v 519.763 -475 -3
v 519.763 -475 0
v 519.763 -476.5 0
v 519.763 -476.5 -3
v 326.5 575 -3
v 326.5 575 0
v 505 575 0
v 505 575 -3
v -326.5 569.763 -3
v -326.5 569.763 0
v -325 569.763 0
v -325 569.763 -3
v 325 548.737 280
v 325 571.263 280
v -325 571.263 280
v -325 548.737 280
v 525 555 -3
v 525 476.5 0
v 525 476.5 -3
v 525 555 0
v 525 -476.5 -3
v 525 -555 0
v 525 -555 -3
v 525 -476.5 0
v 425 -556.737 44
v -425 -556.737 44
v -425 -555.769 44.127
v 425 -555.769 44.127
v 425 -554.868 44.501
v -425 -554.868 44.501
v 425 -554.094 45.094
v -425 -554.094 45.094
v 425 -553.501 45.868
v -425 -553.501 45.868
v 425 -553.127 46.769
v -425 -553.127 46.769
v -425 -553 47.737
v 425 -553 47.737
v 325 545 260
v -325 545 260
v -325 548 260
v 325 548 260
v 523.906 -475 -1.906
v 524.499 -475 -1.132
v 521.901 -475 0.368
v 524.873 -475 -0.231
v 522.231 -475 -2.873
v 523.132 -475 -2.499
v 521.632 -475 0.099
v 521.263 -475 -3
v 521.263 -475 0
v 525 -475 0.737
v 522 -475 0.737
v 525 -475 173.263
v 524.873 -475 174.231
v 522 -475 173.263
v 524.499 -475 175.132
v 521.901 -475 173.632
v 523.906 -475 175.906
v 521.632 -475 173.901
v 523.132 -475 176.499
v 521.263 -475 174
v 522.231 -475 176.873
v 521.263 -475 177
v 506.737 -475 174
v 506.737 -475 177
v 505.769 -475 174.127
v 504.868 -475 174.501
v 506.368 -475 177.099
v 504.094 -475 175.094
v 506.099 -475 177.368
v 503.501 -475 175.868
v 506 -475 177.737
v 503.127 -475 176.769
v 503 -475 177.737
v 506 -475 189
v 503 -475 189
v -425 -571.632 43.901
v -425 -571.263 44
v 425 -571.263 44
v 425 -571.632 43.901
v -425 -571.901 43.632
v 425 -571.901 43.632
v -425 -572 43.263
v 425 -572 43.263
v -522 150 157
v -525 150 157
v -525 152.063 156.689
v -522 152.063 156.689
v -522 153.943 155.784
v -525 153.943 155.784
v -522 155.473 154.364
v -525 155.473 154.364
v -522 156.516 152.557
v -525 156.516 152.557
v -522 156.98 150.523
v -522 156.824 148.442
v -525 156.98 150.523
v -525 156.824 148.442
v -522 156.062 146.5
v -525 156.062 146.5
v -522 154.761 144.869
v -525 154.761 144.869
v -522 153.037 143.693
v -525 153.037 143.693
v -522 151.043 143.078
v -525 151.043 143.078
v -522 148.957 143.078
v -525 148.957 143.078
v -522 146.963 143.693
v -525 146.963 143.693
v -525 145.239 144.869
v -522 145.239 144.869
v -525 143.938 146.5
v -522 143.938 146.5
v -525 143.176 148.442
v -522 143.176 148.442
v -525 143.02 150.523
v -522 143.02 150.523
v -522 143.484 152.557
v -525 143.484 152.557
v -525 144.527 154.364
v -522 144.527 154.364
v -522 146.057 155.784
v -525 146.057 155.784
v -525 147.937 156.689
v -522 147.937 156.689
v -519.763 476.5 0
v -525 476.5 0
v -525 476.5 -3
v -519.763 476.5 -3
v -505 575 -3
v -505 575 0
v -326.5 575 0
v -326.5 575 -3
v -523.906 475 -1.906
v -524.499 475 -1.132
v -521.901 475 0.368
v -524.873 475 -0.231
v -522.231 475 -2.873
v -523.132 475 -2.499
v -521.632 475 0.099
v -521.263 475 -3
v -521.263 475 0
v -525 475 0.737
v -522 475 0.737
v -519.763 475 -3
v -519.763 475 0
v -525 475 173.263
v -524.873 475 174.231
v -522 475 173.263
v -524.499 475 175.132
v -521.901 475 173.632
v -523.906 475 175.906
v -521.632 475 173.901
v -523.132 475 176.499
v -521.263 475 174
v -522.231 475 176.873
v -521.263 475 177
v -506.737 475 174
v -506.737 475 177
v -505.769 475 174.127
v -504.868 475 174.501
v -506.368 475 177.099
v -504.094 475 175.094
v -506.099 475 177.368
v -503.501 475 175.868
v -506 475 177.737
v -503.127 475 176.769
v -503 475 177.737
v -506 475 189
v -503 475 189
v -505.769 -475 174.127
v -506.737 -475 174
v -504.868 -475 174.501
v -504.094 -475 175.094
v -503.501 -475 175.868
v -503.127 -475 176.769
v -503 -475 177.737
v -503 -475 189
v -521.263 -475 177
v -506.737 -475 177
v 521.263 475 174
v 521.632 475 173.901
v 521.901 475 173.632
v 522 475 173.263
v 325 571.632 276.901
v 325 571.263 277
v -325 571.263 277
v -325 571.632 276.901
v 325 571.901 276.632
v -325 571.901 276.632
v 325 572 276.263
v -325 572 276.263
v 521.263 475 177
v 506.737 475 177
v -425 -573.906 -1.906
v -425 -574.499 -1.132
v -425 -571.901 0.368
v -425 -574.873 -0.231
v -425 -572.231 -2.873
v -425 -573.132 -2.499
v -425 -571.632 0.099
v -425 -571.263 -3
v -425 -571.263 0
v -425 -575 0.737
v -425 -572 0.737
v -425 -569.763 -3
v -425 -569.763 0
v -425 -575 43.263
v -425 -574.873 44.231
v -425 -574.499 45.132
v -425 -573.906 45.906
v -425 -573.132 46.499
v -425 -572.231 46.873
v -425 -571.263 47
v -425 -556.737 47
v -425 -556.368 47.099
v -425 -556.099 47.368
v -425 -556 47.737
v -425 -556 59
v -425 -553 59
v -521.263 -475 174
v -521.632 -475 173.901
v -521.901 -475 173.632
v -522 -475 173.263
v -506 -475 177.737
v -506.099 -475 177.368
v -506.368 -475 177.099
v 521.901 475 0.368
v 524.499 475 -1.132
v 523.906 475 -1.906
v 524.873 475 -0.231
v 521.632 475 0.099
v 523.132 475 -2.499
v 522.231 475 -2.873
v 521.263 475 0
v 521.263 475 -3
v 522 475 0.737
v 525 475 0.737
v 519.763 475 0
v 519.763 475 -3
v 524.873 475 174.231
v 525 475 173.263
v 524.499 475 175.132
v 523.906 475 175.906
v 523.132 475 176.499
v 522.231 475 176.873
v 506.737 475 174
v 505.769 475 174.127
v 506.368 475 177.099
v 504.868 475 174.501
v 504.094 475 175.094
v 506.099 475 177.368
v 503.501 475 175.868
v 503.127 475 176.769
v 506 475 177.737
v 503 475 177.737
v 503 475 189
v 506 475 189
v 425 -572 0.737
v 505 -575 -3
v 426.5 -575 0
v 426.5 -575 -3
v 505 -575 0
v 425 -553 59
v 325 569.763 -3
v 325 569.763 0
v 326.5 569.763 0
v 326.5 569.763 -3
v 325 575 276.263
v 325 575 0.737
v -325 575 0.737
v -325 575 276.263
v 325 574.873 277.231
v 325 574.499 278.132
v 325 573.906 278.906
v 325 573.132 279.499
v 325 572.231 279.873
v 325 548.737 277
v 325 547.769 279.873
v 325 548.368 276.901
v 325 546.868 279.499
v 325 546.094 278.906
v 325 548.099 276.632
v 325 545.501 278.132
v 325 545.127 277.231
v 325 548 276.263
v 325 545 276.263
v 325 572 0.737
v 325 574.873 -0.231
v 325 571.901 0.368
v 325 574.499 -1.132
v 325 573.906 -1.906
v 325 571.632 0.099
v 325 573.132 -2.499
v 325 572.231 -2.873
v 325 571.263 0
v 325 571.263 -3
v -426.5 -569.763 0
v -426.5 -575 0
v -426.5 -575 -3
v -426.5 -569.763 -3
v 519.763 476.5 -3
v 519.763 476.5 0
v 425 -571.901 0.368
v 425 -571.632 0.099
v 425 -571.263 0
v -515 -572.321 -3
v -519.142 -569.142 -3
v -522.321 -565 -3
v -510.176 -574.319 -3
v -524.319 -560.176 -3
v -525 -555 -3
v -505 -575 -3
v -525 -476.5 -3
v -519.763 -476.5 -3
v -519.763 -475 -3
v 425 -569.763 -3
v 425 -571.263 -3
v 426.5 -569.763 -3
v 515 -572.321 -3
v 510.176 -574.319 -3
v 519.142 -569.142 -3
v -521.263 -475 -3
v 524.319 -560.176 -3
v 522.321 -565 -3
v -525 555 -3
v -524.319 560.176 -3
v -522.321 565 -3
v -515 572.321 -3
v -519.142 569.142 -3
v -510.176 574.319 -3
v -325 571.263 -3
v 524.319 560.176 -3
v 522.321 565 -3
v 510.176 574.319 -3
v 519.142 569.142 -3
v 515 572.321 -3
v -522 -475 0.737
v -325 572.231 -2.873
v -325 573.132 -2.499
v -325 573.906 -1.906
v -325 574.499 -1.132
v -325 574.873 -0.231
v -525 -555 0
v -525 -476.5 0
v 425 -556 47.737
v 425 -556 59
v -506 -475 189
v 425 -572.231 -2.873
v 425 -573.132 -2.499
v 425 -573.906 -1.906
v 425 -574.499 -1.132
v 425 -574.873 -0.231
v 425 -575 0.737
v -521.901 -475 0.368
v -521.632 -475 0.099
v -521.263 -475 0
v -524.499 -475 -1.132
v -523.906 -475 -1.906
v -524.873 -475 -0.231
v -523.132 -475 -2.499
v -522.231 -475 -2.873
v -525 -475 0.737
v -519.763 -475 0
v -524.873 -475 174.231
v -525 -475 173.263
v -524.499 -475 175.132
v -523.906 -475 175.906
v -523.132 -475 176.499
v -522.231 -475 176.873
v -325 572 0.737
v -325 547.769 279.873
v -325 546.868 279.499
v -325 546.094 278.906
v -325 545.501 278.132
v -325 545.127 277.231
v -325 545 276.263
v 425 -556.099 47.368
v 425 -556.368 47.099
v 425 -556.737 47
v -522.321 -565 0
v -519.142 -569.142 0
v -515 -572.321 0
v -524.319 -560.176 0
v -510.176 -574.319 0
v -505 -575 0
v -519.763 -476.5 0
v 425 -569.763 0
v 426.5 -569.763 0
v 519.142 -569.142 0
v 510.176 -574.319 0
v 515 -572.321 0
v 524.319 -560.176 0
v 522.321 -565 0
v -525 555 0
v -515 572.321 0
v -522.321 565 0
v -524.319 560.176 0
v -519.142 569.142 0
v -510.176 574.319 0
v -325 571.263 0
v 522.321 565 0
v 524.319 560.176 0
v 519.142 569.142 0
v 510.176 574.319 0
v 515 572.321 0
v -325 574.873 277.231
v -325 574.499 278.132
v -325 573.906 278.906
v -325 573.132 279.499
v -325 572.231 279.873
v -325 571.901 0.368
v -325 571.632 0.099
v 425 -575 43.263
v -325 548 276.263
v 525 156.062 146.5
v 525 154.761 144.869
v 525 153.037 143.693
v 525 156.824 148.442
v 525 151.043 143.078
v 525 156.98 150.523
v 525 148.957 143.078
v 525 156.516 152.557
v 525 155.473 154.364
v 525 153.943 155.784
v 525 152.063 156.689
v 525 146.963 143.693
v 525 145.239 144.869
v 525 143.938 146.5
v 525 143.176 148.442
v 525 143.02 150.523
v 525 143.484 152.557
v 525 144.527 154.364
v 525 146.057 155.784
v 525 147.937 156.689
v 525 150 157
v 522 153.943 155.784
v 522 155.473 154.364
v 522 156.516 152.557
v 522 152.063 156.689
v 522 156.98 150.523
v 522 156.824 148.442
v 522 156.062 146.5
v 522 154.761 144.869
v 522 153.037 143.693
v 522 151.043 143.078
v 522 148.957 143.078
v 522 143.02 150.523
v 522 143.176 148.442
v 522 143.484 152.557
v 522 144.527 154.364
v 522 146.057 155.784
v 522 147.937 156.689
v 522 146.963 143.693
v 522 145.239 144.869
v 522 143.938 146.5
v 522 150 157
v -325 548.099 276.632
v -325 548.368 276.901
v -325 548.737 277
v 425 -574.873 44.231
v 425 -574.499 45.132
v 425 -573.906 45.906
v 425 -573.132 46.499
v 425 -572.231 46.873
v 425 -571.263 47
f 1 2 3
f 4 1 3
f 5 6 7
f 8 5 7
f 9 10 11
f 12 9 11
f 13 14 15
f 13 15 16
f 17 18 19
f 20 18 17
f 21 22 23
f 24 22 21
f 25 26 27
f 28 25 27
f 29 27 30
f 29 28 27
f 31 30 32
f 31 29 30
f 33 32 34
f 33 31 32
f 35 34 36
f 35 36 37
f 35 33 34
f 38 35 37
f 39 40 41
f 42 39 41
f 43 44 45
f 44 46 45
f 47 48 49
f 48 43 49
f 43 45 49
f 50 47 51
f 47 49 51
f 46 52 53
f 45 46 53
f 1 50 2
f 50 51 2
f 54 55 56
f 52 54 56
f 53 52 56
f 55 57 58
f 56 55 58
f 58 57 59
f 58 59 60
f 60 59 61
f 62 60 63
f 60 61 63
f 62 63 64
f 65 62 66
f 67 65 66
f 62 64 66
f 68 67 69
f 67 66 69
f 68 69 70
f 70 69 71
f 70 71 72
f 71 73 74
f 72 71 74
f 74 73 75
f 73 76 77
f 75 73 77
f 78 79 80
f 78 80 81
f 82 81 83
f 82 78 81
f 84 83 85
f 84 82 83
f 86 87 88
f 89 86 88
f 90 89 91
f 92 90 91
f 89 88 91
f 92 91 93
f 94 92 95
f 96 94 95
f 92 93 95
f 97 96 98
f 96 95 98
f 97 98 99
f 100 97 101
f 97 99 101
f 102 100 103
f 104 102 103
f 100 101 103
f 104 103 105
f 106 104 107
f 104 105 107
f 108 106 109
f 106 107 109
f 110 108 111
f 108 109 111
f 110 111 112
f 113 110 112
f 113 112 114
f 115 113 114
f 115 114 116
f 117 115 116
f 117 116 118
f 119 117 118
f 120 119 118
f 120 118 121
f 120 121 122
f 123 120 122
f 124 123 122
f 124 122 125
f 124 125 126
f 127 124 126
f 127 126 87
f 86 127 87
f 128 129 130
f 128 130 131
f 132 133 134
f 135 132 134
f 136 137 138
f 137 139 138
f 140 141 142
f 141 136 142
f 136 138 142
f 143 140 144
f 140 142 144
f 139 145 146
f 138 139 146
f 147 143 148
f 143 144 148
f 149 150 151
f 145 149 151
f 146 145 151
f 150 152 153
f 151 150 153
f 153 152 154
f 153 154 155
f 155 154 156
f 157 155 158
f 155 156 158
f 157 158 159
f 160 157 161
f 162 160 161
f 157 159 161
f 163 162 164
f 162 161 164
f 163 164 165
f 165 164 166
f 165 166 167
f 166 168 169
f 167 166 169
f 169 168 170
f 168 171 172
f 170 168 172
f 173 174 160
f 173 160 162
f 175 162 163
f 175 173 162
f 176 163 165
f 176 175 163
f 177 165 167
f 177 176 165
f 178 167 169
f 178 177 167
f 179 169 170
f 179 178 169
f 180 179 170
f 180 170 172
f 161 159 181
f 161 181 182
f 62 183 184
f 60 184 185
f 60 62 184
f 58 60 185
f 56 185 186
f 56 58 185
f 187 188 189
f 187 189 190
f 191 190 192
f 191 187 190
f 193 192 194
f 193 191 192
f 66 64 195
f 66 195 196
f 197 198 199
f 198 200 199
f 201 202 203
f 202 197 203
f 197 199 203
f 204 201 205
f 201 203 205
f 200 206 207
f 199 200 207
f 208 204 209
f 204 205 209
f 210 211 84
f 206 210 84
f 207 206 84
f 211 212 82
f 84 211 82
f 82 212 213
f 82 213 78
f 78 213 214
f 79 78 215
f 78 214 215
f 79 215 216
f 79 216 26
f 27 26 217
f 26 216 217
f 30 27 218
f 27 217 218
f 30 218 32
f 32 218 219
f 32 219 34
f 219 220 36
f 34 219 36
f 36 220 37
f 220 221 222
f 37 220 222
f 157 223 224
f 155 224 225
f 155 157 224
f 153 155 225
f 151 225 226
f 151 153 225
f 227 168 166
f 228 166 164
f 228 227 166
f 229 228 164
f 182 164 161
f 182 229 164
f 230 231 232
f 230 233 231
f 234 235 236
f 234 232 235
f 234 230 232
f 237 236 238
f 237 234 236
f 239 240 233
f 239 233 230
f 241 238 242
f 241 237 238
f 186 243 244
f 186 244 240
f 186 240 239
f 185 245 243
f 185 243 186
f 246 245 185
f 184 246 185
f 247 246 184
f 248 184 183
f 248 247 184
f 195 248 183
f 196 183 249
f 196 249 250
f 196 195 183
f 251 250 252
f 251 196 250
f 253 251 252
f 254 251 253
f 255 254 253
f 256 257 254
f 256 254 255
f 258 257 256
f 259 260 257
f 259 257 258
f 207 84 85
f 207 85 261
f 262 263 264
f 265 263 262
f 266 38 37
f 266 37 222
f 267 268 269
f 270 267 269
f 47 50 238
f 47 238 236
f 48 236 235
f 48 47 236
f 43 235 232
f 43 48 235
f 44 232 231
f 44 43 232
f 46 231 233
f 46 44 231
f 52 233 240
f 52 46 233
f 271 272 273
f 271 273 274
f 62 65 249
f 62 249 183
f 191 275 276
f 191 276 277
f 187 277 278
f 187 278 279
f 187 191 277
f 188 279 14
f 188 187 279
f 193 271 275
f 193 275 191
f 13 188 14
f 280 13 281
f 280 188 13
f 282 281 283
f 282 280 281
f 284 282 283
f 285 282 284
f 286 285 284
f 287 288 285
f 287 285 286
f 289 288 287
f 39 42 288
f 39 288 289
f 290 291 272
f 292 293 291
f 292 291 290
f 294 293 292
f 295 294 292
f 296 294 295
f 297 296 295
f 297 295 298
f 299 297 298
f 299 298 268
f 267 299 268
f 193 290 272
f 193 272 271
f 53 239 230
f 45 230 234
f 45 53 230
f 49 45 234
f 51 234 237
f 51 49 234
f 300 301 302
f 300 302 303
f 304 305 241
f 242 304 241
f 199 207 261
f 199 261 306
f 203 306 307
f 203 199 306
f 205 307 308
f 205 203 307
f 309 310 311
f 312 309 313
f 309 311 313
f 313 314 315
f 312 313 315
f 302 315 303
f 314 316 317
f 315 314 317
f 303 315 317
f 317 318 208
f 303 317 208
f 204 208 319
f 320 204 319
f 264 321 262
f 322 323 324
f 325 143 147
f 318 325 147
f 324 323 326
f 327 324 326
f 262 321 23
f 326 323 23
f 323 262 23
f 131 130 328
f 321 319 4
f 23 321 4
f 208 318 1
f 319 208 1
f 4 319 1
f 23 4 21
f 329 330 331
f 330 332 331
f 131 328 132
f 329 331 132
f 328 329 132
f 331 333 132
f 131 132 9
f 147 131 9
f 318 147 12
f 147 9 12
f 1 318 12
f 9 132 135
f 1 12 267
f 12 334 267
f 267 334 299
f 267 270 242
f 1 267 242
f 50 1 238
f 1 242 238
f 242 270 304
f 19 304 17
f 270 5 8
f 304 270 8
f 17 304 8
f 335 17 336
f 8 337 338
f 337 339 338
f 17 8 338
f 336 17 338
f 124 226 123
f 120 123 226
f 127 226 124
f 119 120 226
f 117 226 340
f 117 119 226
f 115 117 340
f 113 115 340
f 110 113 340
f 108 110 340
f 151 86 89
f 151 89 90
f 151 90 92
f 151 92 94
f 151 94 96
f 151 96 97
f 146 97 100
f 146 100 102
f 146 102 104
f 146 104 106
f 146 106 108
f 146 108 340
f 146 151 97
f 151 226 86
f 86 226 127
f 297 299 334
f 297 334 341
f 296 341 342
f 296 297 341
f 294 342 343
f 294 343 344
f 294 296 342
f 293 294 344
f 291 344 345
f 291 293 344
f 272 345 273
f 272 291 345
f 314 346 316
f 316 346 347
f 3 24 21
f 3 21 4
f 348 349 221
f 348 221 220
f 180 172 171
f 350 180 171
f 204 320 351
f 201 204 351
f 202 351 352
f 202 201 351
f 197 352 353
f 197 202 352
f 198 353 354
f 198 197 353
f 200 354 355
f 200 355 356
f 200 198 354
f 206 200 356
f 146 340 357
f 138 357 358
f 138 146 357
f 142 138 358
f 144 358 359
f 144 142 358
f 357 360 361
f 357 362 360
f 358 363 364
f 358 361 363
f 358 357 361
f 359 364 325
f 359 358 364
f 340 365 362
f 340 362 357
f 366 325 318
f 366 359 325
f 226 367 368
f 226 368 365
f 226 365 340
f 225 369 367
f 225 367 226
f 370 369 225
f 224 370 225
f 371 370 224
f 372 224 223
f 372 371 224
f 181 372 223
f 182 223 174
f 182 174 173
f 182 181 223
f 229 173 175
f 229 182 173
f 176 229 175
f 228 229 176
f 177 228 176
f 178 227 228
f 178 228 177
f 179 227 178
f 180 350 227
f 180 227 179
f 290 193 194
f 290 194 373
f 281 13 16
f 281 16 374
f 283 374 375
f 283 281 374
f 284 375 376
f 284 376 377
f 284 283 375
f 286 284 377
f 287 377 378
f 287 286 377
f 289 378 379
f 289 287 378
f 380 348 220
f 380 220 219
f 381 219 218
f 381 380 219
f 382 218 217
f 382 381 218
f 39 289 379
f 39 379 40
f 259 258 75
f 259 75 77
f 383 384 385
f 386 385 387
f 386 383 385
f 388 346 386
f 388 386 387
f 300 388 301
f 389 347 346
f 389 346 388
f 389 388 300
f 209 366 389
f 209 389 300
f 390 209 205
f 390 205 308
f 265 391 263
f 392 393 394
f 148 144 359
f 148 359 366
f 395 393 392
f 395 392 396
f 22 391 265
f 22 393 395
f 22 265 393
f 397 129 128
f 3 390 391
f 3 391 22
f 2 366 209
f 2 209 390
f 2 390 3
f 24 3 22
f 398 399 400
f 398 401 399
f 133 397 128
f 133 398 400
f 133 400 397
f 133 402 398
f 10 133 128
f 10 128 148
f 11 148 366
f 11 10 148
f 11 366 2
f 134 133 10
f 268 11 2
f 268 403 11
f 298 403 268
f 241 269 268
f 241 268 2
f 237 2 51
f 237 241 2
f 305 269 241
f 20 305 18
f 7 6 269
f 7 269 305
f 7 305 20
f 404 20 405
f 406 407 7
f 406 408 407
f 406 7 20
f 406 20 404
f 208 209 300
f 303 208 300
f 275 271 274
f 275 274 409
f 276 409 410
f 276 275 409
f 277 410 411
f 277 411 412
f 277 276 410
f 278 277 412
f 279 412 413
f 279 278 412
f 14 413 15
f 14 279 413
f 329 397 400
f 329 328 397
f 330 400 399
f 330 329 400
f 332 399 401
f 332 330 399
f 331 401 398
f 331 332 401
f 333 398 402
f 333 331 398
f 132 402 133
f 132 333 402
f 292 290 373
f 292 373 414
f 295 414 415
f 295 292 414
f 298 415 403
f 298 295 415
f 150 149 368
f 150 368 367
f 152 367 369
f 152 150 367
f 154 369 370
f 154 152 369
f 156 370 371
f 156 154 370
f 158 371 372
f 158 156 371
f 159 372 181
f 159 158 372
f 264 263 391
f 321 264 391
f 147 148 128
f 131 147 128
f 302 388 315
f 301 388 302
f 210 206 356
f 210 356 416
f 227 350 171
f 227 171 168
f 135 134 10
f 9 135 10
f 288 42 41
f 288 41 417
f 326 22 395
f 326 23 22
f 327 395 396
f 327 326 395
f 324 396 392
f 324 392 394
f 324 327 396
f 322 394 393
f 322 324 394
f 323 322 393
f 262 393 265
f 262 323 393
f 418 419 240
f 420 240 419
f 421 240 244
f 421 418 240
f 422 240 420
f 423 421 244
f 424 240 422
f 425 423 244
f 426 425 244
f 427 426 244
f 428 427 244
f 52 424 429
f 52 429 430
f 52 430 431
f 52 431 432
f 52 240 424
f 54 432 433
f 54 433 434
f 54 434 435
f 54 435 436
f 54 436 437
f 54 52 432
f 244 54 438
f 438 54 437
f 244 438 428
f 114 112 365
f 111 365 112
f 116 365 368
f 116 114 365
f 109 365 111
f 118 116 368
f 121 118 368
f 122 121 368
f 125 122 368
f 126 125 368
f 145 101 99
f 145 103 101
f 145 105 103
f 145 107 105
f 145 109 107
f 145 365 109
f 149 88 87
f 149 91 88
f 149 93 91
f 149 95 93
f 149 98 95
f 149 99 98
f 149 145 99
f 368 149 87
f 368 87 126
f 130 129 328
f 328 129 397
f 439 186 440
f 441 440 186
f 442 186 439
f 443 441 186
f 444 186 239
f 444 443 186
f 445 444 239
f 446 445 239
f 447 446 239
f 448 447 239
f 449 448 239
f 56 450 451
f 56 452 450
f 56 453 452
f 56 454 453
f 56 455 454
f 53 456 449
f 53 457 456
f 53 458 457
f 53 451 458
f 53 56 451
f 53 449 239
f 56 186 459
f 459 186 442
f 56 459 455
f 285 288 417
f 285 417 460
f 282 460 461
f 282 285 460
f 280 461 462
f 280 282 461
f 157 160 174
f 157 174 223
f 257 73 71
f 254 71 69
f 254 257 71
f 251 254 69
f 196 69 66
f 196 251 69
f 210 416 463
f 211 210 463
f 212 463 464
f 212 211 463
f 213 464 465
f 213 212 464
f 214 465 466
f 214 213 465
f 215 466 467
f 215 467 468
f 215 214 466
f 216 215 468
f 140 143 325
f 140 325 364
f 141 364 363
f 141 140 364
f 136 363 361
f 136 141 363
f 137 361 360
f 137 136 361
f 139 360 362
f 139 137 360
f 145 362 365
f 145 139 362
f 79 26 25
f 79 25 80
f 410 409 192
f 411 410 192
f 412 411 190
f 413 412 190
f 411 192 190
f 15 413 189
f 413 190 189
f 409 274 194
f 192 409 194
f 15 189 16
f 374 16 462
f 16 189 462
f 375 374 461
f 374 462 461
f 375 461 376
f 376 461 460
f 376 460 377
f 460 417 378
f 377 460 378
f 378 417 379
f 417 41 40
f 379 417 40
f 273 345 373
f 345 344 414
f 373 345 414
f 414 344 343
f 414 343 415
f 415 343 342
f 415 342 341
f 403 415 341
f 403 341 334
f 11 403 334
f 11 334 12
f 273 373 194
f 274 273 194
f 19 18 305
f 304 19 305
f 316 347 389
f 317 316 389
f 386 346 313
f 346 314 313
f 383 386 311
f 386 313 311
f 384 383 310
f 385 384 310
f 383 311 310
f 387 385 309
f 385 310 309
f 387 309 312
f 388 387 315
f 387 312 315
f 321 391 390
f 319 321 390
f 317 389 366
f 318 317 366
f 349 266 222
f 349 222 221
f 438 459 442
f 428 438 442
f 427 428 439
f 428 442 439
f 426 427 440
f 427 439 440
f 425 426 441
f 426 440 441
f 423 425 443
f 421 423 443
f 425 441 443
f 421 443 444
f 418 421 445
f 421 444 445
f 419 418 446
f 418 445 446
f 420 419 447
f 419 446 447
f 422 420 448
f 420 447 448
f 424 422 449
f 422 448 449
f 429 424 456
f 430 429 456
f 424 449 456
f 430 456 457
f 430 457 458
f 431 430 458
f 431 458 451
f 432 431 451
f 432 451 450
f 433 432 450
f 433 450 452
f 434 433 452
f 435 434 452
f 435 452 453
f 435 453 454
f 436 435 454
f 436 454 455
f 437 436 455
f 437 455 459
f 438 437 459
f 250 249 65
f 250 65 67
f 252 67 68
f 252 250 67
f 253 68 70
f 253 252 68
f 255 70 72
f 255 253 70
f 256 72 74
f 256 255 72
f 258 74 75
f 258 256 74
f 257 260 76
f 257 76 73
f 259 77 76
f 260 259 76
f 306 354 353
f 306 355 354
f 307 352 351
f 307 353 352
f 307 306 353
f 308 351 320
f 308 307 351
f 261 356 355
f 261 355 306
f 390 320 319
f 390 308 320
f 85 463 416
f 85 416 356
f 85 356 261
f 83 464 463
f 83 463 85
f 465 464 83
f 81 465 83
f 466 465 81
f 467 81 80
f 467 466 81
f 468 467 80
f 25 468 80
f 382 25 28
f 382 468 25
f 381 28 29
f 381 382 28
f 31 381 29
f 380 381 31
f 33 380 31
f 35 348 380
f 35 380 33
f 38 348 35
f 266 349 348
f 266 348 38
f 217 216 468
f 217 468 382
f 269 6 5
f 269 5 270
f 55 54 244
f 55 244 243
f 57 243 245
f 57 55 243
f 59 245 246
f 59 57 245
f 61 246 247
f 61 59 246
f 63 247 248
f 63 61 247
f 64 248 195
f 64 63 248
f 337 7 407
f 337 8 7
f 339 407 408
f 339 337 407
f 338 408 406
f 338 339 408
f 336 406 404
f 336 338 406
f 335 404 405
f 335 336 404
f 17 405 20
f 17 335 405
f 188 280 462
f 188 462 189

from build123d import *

# Parameters (mm, degrees)
SKETCH_2_W                          = 1050
SKETCH_2_H                          = 1150
SM_BASE_FLANGE_1_DEPTH              = 3
SM_EDGE_FLANGE_1_STRIP_W            = 13.4732
SM_EDGE_FLANGE_1_STRIP_H            = 3
SM_EDGE_FLANGE_1_STRIP_CUT_DEPTH    = 950
SM_EDGE_FLANGE_1_RELIEF_W           = 14.9732
SM_EDGE_FLANGE_1_RELIEF_H           = 1.5
SM_EDGE_FLANGE_1_RELIEF_CUT_DEPTH   = 3
SM_EDGE_FLANGE_1_STRIP_2_W          = 13.4732
SM_EDGE_FLANGE_1_STRIP_2_H          = 3
SM_EDGE_FLANGE_1_STRIP_CUT_2_DEPTH  = 950
SM_EDGE_FLANGE_1_RELIEF_2_W         = 14.9732
SM_EDGE_FLANGE_1_RELIEF_2_H         = 1.5
SM_EDGE_FLANGE_1_RELIEF_CUT_2_DEPTH = 3
SM_EDGE_FLANGE_1_DEPTH              = 950
SM_EDGE_FLANGE_1_BEND_DEPTH         = 950
SM_EDGE_FLANGE_4_STRIP_W            = 13.4732
SM_EDGE_FLANGE_4_STRIP_H            = 3
SM_EDGE_FLANGE_4_STRIP_CUT_DEPTH    = 850
SM_EDGE_FLANGE_4_RELIEF_W           = 14.9732
SM_EDGE_FLANGE_4_RELIEF_H           = 1.5
SM_EDGE_FLANGE_4_RELIEF_CUT_DEPTH   = 3
SM_EDGE_FLANGE_4_DEPTH              = 850
SM_EDGE_FLANGE_5_STRIP_W            = 13.4732
SM_EDGE_FLANGE_5_STRIP_H            = 3
SM_EDGE_FLANGE_5_STRIP_CUT_DEPTH    = 650
SM_EDGE_FLANGE_5_RELIEF_W           = 14.9732
SM_EDGE_FLANGE_5_RELIEF_H           = 1.5
SM_EDGE_FLANGE_5_RELIEF_CUT_DEPTH   = 3
SM_EDGE_FLANGE_5_DEPTH              = 650
SM_EDGE_FLANGE_2_STRIP_W            = 13.4732
SM_EDGE_FLANGE_2_STRIP_H            = 3
SM_EDGE_FLANGE_2_STRIP_CUT_DEPTH    = 950
SM_EDGE_FLANGE_2_STRIP_2_W          = 13.4732
SM_EDGE_FLANGE_2_STRIP_2_H          = 3
SM_EDGE_FLANGE_2_STRIP_CUT_2_DEPTH  = 950
SM_EDGE_FLANGE_2_STRIP_3_W          = 13.4732
SM_EDGE_FLANGE_2_STRIP_3_H          = 3
SM_EDGE_FLANGE_2_STRIP_CUT_3_DEPTH  = 850
SM_EDGE_FLANGE_2_DEPTH              = 950
SM_EDGE_FLANGE_2_BEND_DEPTH         = 950
SM_EDGE_FLANGE_2_BEND_2_DEPTH       = 850
SM_EDGE_FLANGE_3_STRIP_W            = 13.4732
SM_EDGE_FLANGE_3_STRIP_H            = 3
SM_EDGE_FLANGE_3_STRIP_CUT_DEPTH    = 950
SM_EDGE_FLANGE_3_STRIP_2_W          = 13.4732
SM_EDGE_FLANGE_3_STRIP_2_H          = 3
SM_EDGE_FLANGE_3_STRIP_CUT_2_DEPTH  = 950
SM_EDGE_FLANGE_3_STRIP_3_W          = 13.4732
SM_EDGE_FLANGE_3_STRIP_3_H          = 3
SM_EDGE_FLANGE_3_STRIP_CUT_3_DEPTH  = 850
SM_EDGE_FLANGE_3_DEPTH              = 950
SM_EDGE_FLANGE_3_BEND_DEPTH         = 950
SM_EDGE_FLANGE_3_BEND_2_DEPTH       = 850
FILLET_1_R                          = 20
SM_EDGE_FLANGE_6_STRIP_W            = 13.4732
SM_EDGE_FLANGE_6_STRIP_H            = 3
SM_EDGE_FLANGE_6_STRIP_CUT_DEPTH    = 650
SM_EDGE_FLANGE_6_DEPTH              = 650
SM_EDGE_FLANGE_7_STRIP_W            = 13.4732
SM_EDGE_FLANGE_7_STRIP_H            = 3
SM_EDGE_FLANGE_7_STRIP_CUT_DEPTH    = 650
SM_EDGE_FLANGE_7_DEPTH              = 650
SKETCH_60_R                         = 7
CUT_EXTRUDE_1_DEPTH                 = 1230.440929854


# Sheet-metal steps are written as plain solids
with BuildPart() as part:
    # Sketch 2 → 基体-法兰1 (new body)
    with BuildSketch(Plane.XY):
        Rectangle(SKETCH_2_W, SKETCH_2_H)
    extrude(amount=-SM_BASE_FLANGE_1_DEPTH)

    # 边线-法兰1 strip (across the edge) → 边线-法兰1 strip cut (cut)
    with BuildSketch(Plane(origin=(-525, 475, 0), x_dir=(1, 0, 0), z_dir=(0, -1, 0))):
        with Locations((-3, -1.5)):
            Rectangle(SM_EDGE_FLANGE_1_STRIP_W, SM_EDGE_FLANGE_1_STRIP_H)
    extrude(amount=SM_EDGE_FLANGE_1_STRIP_CUT_DEPTH, mode=Mode.SUBTRACT)

    # 边线-法兰1 relief (on the sheet) → 边线-法兰1 relief cut (cut)
    with BuildSketch(Plane(origin=(-521.2634, 475, 0), x_dir=(1, 0, 0), z_dir=(0, 0, 1))):
        with Locations((-5.9866, 0.75)):
            Rectangle(SM_EDGE_FLANGE_1_RELIEF_W, SM_EDGE_FLANGE_1_RELIEF_H)
        with Locations((-5.9866, -950.75)):
            Rectangle(SM_EDGE_FLANGE_1_RELIEF_W, SM_EDGE_FLANGE_1_RELIEF_H)
    extrude(amount=-SM_EDGE_FLANGE_1_RELIEF_CUT_DEPTH, mode=Mode.SUBTRACT)

    # 边线-法兰1 strip 2 (across the edge) → 边线-法兰1 strip cut 2 (cut)
    with BuildSketch(Plane(origin=(525, -475, 0), x_dir=(-1, 0, 0), z_dir=(0, 1, 0))):
        with Locations((-3, -1.5)):
            Rectangle(SM_EDGE_FLANGE_1_STRIP_2_W, SM_EDGE_FLANGE_1_STRIP_2_H)
    extrude(amount=SM_EDGE_FLANGE_1_STRIP_CUT_2_DEPTH, mode=Mode.SUBTRACT)

    # 边线-法兰1 relief 2 (on the sheet) → 边线-法兰1 relief cut 2 (cut)
    with BuildSketch(Plane(origin=(521.2634, -475, 0), x_dir=(-1, 0, 0), z_dir=(0, 0, 1))):
        with Locations((-5.9866, 0.75)):
            Rectangle(SM_EDGE_FLANGE_1_RELIEF_2_W, SM_EDGE_FLANGE_1_RELIEF_2_H)
        with Locations((-5.9866, -950.75)):
            Rectangle(SM_EDGE_FLANGE_1_RELIEF_2_W, SM_EDGE_FLANGE_1_RELIEF_2_H)
    extrude(amount=-SM_EDGE_FLANGE_1_RELIEF_CUT_2_DEPTH, mode=Mode.SUBTRACT)

    # 边线-法兰1 section (across the edge) → 边线-法兰1 (add)
    with BuildSketch(Plane(origin=(-525, 475, 0), x_dir=(1, 0, 0), z_dir=(0, -1, 0))):
        with BuildLine():
            Line((0, 0.7366), (0, 177))
            Line((0, 177), (3, 177))
            Line((3, 177), (3, 0.7366))
            ThreePointArc((3, 0.7366), (3.215745145, 0.215745145), (3.7366, 0))
            Line((3.7366, 0), (3.7366, -3))
            ThreePointArc((3.7366, -3), (1.094424801, -1.905575199), (0, 0.7366))
        make_face()
    extrude(amount=SM_EDGE_FLANGE_1_DEPTH)

    # 边线-法兰1 section 2 (across the edge) → 边线-法兰1 bend (add)
    with BuildSketch(Plane(origin=(525, -475, 0), x_dir=(-1, 0, 0), z_dir=(0, 1, 0))):
        with BuildLine():
            Line((0, 0.7366), (0, 177))
            Line((0, 177), (3, 177))
            Line((3, 177), (3, 0.7366))
            ThreePointArc((3, 0.7366), (3.215745145, 0.215745145), (3.7366, 0))
            Line((3.7366, 0), (3.7366, -3))
            ThreePointArc((3.7366, -3), (1.094424801, -1.905575199), (0, 0.7366))
        make_face()
    extrude(amount=SM_EDGE_FLANGE_1_BEND_DEPTH)

    # 边线-法兰4 strip (across the edge) → 边线-法兰4 strip cut (cut)
    with BuildSketch(Plane(origin=(-425, -575, 0), x_dir=(0, 1, 0), z_dir=(1, 0, 0))):
        with Locations((-3, -1.5)):
            Rectangle(SM_EDGE_FLANGE_4_STRIP_W, SM_EDGE_FLANGE_4_STRIP_H)
    extrude(amount=SM_EDGE_FLANGE_4_STRIP_CUT_DEPTH, mode=Mode.SUBTRACT)

    # 边线-法兰4 relief (on the sheet) → 边线-法兰4 relief cut (cut)
    with BuildSketch(Plane(origin=(-425, -571.2634, 0), x_dir=(0, 1, 0), z_dir=(0, 0, 1))):
        with Locations((-5.9866, 0.75)):
            Rectangle(SM_EDGE_FLANGE_4_RELIEF_W, SM_EDGE_FLANGE_4_RELIEF_H)
        with Locations((-5.9866, -850.75)):
            Rectangle(SM_EDGE_FLANGE_4_RELIEF_W, SM_EDGE_FLANGE_4_RELIEF_H)
    extrude(amount=-SM_EDGE_FLANGE_4_RELIEF_CUT_DEPTH, mode=Mode.SUBTRACT)

    # 边线-法兰4 section (across the edge) → 边线-法兰4 (add)
    with BuildSketch(Plane(origin=(-425, -575, 0), x_dir=(0, 1, 0), z_dir=(1, 0, 0))):
        with BuildLine():
            Line((0, 0.7366), (0, 47))
            Line((0, 47), (3, 47))
            Line((3, 47), (3, 0.7366))
            ThreePointArc((3, 0.7366), (3.215745145, 0.215745145), (3.7366, 0))
            Line((3.7366, 0), (3.7366, -3))
            ThreePointArc((3.7366, -3), (1.094424801, -1.905575199), (0, 0.7366))
        make_face()
    extrude(amount=SM_EDGE_FLANGE_4_DEPTH)

    # 边线-法兰5 strip (across the edge) → 边线-法兰5 strip cut (cut)
    with BuildSketch(Plane(origin=(325, 575, 0), x_dir=(0, -1, 0), z_dir=(-1, 0, 0))):
        with Locations((-3, -1.5)):
            Rectangle(SM_EDGE_FLANGE_5_STRIP_W, SM_EDGE_FLANGE_5_STRIP_H)
    extrude(amount=SM_EDGE_FLANGE_5_STRIP_CUT_DEPTH, mode=Mode.SUBTRACT)

    # 边线-法兰5 relief (on the sheet) → 边线-法兰5 relief cut (cut)
    with BuildSketch(Plane(origin=(325, 571.2634, 0), x_dir=(0, -1, 0), z_dir=(0, 0, 1))):
        with Locations((-5.9866, 0.75)):
            Rectangle(SM_EDGE_FLANGE_5_RELIEF_W, SM_EDGE_FLANGE_5_RELIEF_H)
        with Locations((-5.9866, -650.75)):
            Rectangle(SM_EDGE_FLANGE_5_RELIEF_W, SM_EDGE_FLANGE_5_RELIEF_H)
    extrude(amount=-SM_EDGE_FLANGE_5_RELIEF_CUT_DEPTH, mode=Mode.SUBTRACT)

    # 边线-法兰5 section (across the edge) → 边线-法兰5 (add)
    with BuildSketch(Plane(origin=(325, 575, 0), x_dir=(0, -1, 0), z_dir=(-1, 0, 0))):
        with BuildLine():
            Line((0, 0.7366), (0, 280))
            Line((0, 280), (3, 280))
            Line((3, 280), (3, 0.7366))
            ThreePointArc((3, 0.7366), (3.215745145, 0.215745145), (3.7366, 0))
            Line((3.7366, 0), (3.7366, -3))
            ThreePointArc((3.7366, -3), (1.094424801, -1.905575199), (0, 0.7366))
        make_face()
    extrude(amount=SM_EDGE_FLANGE_5_DEPTH)

    # 边线-法兰2 strip (across the edge) → 边线-法兰2 strip cut (cut)
    with BuildSketch(Plane(origin=(-522, 475, 177), x_dir=(0, 0, -1), z_dir=(0, -1, 0))):
        with Locations((-3, -1.5)):
            Rectangle(SM_EDGE_FLANGE_2_STRIP_W, SM_EDGE_FLANGE_2_STRIP_H)
    extrude(amount=SM_EDGE_FLANGE_2_STRIP_CUT_DEPTH, mode=Mode.SUBTRACT)

    # 边线-法兰2 strip 2 (across the edge) → 边线-法兰2 strip cut 2 (cut)
    with BuildSketch(Plane(origin=(522, -475, 177), x_dir=(0, 0, -1), z_dir=(0, 1, 0))):
        with Locations((-3, -1.5)):
            Rectangle(SM_EDGE_FLANGE_2_STRIP_2_W, SM_EDGE_FLANGE_2_STRIP_2_H)
    extrude(amount=SM_EDGE_FLANGE_2_STRIP_CUT_2_DEPTH, mode=Mode.SUBTRACT)

    # 边线-法兰2 strip 3 (across the edge) → 边线-法兰2 strip cut 3 (cut)
    with BuildSketch(Plane(origin=(-425, -572, 47), x_dir=(0, 0, -1), z_dir=(1, 0, 0))):
        with Locations((-3, -1.5)):
            Rectangle(SM_EDGE_FLANGE_2_STRIP_3_W, SM_EDGE_FLANGE_2_STRIP_3_H)
    extrude(amount=SM_EDGE_FLANGE_2_STRIP_CUT_3_DEPTH, mode=Mode.SUBTRACT)

    # 边线-法兰2 section (across the edge) → 边线-法兰2 (add)
    with BuildSketch(Plane(origin=(-522, 475, 177), x_dir=(0, 0, -1), z_dir=(0, -1, 0))):
        with BuildLine():
            Line((0, 0.7366), (0, 19))
            Line((0, 19), (3, 19))
            Line((3, 19), (3, 0.7366))
            ThreePointArc((3, 0.7366), (3.215745145, 0.215745145), (3.7366, 0))
            Line((3.7366, 0), (3.7366, -3))
            ThreePointArc((3.7366, -3), (1.094424801, -1.905575199), (0, 0.7366))
        make_face()
    extrude(amount=SM_EDGE_FLANGE_2_DEPTH)

    # 边线-法兰2 section 2 (across the edge) → 边线-法兰2 bend (add)
    with BuildSketch(Plane(origin=(522, -475, 177), x_dir=(0, 0, -1), z_dir=(0, 1, 0))):
        with BuildLine():
            Line((0, 0.7366), (0, 19))
            Line((0, 19), (3, 19))
            Line((3, 19), (3, 0.7366))
            ThreePointArc((3, 0.7366), (3.215745145, 0.215745145), (3.7366, 0))
            Line((3.7366, 0), (3.7366, -3))
            ThreePointArc((3.7366, -3), (1.094424801, -1.905575199), (0, 0.7366))
        make_face()
    extrude(amount=SM_EDGE_FLANGE_2_BEND_DEPTH)

    # 边线-法兰2 section 3 (across the edge) → 边线-法兰2 bend 2 (add)
    with BuildSketch(Plane(origin=(-425, -572, 47), x_dir=(0, 0, -1), z_dir=(1, 0, 0))):
        with BuildLine():
            Line((0, 0.7366), (0, 19))
            Line((0, 19), (3, 19))
            Line((3, 19), (3, 0.7366))
            ThreePointArc((3, 0.7366), (3.215745145, 0.215745145), (3.7366, 0))
            Line((3.7366, 0), (3.7366, -3))
            ThreePointArc((3.7366, -3), (1.094424801, -1.905575199), (0, 0.7366))
        make_face()
    extrude(amount=SM_EDGE_FLANGE_2_BEND_2_DEPTH)

    # 边线-法兰3 strip (across the edge) → 边线-法兰3 strip cut (cut)
    with BuildSketch(Plane(origin=(-503, -475, 177), x_dir=(-1, 0, 0), z_dir=(0, 1, 0))):
        with Locations((-3, -1.5)):
            Rectangle(SM_EDGE_FLANGE_3_STRIP_W, SM_EDGE_FLANGE_3_STRIP_H)
    extrude(amount=SM_EDGE_FLANGE_3_STRIP_CUT_DEPTH, mode=Mode.SUBTRACT)

    # 边线-法兰3 strip 2 (across the edge) → 边线-法兰3 strip cut 2 (cut)
    with BuildSketch(Plane(origin=(503, 475, 177), x_dir=(1, 0, 0), z_dir=(0, -1, 0))):
        with Locations((-3, -1.5)):
            Rectangle(SM_EDGE_FLANGE_3_STRIP_2_W, SM_EDGE_FLANGE_3_STRIP_2_H)
    extrude(amount=SM_EDGE_FLANGE_3_STRIP_CUT_2_DEPTH, mode=Mode.SUBTRACT)

    # 边线-法兰3 strip 3 (across the edge) → 边线-法兰3 strip cut 3 (cut)
    with BuildSketch(Plane(origin=(425, -553, 47), x_dir=(0, -1, 0), z_dir=(-1, 0, 0))):
        with Locations((-3, -1.5)):
            Rectangle(SM_EDGE_FLANGE_3_STRIP_3_W, SM_EDGE_FLANGE_3_STRIP_3_H)
    extrude(amount=SM_EDGE_FLANGE_3_STRIP_CUT_3_DEPTH, mode=Mode.SUBTRACT)

    # 边线-法兰3 section (across the edge) → 边线-法兰3 (add)
    with BuildSketch(Plane(origin=(-503, -475, 177), x_dir=(-1, 0, 0), z_dir=(0, 1, 0))):
        with BuildLine():
            Line((0, 0.7366), (0, 12))
            Line((0, 12), (3, 12))
            Line((3, 12), (3, 0.7366))
            ThreePointArc((3, 0.7366), (3.215745145, 0.215745145), (3.7366, 0))
            Line((3.7366, 0), (3.7366, -3))
            ThreePointArc((3.7366, -3), (1.094424801, -1.905575199), (0, 0.7366))
        make_face()
    extrude(amount=SM_EDGE_FLANGE_3_DEPTH)

    # 边线-法兰3 section 2 (across the edge) → 边线-法兰3 bend (add)
    with BuildSketch(Plane(origin=(503, 475, 177), x_dir=(1, 0, 0), z_dir=(0, -1, 0))):
        with BuildLine():
            Line((0, 0.7366), (0, 12))
            Line((0, 12), (3, 12))
            Line((3, 12), (3, 0.7366))
            ThreePointArc((3, 0.7366), (3.215745145, 0.215745145), (3.7366, 0))
            Line((3.7366, 0), (3.7366, -3))
            ThreePointArc((3.7366, -3), (1.094424801, -1.905575199), (0, 0.7366))
        make_face()
    extrude(amount=SM_EDGE_FLANGE_3_BEND_DEPTH)

    # 边线-法兰3 section 3 (across the edge) → 边线-法兰3 bend 2 (add)
    with BuildSketch(Plane(origin=(425, -553, 47), x_dir=(0, -1, 0), z_dir=(-1, 0, 0))):
        with BuildLine():
            Line((0, 0.7366), (0, 12))
            Line((0, 12), (3, 12))
            Line((3, 12), (3, 0.7366))
            ThreePointArc((3, 0.7366), (3.215745145, 0.215745145), (3.7366, 0))
            Line((3.7366, 0), (3.7366, -3))
            ThreePointArc((3.7366, -3), (1.094424801, -1.905575199), (0, 0.7366))
        make_face()
    extrude(amount=SM_EDGE_FLANGE_3_BEND_2_DEPTH)

    # 圆角1
    fillet_1_edges = [part.edges().sort_by_distance(p)[0] for p in [
        (525, -575, -1.5),
        (-525, -575, -1.5),
        (-525, 575, -1.5),
        (525, 575, -1.5),
    ]]
    fillet(fillet_1_edges, radius=FILLET_1_R)

    # 边线-法兰6 strip (across the edge) → 边线-法兰6 strip cut (cut)
    with BuildSketch(Plane(origin=(325, 572, 280), x_dir=(0, 0, -1), z_dir=(-1, 0, 0))):
        with Locations((-3, -1.5)):
            Rectangle(SM_EDGE_FLANGE_6_STRIP_W, SM_EDGE_FLANGE_6_STRIP_H)
    extrude(amount=SM_EDGE_FLANGE_6_STRIP_CUT_DEPTH, mode=Mode.SUBTRACT)

    # 边线-法兰6 section (across the edge) → 边线-法兰6 (add)
    with BuildSketch(Plane(origin=(325, 572, 280), x_dir=(0, 0, -1), z_dir=(-1, 0, 0))):
        with BuildLine():
            Line((0, 0.7366), (0, 27))
            Line((0, 27), (3, 27))
            Line((3, 27), (3, 0.7366))
            ThreePointArc((3, 0.7366), (3.215745145, 0.215745145), (3.7366, 0))
            Line((3.7366, 0), (3.7366, -3))
            ThreePointArc((3.7366, -3), (1.094424801, -1.905575199), (0, 0.7366))
        make_face()
    extrude(amount=SM_EDGE_FLANGE_6_DEPTH)

    # 边线-法兰7 strip (across the edge) → 边线-法兰7 strip cut (cut)
    with BuildSketch(Plane(origin=(325, 545, 277), x_dir=(0, 1, 0), z_dir=(-1, 0, 0))):
        with Locations((-3, -1.5)):
            Rectangle(SM_EDGE_FLANGE_7_STRIP_W, SM_EDGE_FLANGE_7_STRIP_H)
    extrude(amount=SM_EDGE_FLANGE_7_STRIP_CUT_DEPTH, mode=Mode.SUBTRACT)

    # 边线-法兰7 section (across the edge) → 边线-法兰7 (add)
    with BuildSketch(Plane(origin=(325, 545, 277), x_dir=(0, 1, 0), z_dir=(-1, 0, 0))):
        with BuildLine():
            Line((0, 0.7366), (0, 17))
            Line((0, 17), (3, 17))
            Line((3, 17), (3, 0.7366))
            ThreePointArc((3, 0.7366), (3.215745145, 0.215745145), (3.7366, 0))
            Line((3.7366, 0), (3.7366, -3))
            ThreePointArc((3.7366, -3), (1.094424801, -1.905575199), (0, 0.7366))
        make_face()
    extrude(amount=SM_EDGE_FLANGE_7_DEPTH)

    # 草图60 → 切除-拉伸1 (cut, through all)
    with BuildSketch(Plane.ZY.offset(525)):
        with Locations((150, 150)):
            Circle(SKETCH_60_R)
    extrude(amount=-CUT_EXTRUDE_1_DEPTH, mode=Mode.SUBTRACT)


solid = part.part
